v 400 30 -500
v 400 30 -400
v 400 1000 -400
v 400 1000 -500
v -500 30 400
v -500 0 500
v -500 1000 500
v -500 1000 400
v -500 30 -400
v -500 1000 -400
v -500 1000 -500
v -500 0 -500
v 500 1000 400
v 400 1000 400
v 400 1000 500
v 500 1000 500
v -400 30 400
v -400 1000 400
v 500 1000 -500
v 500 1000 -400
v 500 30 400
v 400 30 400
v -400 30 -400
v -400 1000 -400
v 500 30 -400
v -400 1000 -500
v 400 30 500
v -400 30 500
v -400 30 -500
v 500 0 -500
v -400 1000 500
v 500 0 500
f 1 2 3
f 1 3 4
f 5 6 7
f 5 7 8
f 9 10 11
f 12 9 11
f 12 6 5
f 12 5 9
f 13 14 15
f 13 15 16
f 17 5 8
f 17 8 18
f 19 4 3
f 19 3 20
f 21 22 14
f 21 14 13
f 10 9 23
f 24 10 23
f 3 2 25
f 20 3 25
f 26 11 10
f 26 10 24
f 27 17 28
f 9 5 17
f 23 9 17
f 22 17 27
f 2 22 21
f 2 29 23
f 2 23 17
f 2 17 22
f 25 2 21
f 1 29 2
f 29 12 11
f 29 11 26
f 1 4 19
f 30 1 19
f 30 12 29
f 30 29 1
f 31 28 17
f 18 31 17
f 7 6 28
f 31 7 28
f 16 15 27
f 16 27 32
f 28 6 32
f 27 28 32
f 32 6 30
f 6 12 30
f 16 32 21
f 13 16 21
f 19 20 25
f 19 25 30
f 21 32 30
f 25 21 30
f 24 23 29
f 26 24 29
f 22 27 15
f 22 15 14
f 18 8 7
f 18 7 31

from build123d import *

# Parameters (mm, degrees)
BOSS_EXTRUDE1_DEPTH = 30
SKETCH1_3_W         = 100
SKETCH1_3_H         = 100
BOSS_EXTRUDE2_DEPTH = 1000


with BuildPart() as part:
    # Sketch1 → Boss-Extrude1 (new body)
    with BuildSketch(Plane(origin=(0, 0, 0), x_dir=(1, 0, 0), z_dir=(0, 1, 0))):
        Polygon((-400, -500), (400, -500), (400, -400), (500, -400), (500, 400), (400, 400), (400, 500), (-400, 500), (-400, 400), (-500, 400), (-500, -400), (-400, -400), align=None)
    extrude(amount=BOSS_EXTRUDE1_DEPTH)

    # Sketch1<3> → Boss-Extrude2 (add)
    with BuildSketch(Plane(origin=(0, 0, 0), x_dir=(1, 0, 0), z_dir=(0, 1, 0))):
        with Locations((-450, -450)):
            Rectangle(SKETCH1_3_W, SKETCH1_3_H)
        with Locations((-450, 450)):
            Rectangle(SKETCH1_3_W, SKETCH1_3_H)
        with Locations((450, 450)):
            Rectangle(SKETCH1_3_W, SKETCH1_3_H)
        with Locations((450, -450)):
            Rectangle(SKETCH1_3_W, SKETCH1_3_H)
    extrude(amount=BOSS_EXTRUDE2_DEPTH)


solid = part.part
